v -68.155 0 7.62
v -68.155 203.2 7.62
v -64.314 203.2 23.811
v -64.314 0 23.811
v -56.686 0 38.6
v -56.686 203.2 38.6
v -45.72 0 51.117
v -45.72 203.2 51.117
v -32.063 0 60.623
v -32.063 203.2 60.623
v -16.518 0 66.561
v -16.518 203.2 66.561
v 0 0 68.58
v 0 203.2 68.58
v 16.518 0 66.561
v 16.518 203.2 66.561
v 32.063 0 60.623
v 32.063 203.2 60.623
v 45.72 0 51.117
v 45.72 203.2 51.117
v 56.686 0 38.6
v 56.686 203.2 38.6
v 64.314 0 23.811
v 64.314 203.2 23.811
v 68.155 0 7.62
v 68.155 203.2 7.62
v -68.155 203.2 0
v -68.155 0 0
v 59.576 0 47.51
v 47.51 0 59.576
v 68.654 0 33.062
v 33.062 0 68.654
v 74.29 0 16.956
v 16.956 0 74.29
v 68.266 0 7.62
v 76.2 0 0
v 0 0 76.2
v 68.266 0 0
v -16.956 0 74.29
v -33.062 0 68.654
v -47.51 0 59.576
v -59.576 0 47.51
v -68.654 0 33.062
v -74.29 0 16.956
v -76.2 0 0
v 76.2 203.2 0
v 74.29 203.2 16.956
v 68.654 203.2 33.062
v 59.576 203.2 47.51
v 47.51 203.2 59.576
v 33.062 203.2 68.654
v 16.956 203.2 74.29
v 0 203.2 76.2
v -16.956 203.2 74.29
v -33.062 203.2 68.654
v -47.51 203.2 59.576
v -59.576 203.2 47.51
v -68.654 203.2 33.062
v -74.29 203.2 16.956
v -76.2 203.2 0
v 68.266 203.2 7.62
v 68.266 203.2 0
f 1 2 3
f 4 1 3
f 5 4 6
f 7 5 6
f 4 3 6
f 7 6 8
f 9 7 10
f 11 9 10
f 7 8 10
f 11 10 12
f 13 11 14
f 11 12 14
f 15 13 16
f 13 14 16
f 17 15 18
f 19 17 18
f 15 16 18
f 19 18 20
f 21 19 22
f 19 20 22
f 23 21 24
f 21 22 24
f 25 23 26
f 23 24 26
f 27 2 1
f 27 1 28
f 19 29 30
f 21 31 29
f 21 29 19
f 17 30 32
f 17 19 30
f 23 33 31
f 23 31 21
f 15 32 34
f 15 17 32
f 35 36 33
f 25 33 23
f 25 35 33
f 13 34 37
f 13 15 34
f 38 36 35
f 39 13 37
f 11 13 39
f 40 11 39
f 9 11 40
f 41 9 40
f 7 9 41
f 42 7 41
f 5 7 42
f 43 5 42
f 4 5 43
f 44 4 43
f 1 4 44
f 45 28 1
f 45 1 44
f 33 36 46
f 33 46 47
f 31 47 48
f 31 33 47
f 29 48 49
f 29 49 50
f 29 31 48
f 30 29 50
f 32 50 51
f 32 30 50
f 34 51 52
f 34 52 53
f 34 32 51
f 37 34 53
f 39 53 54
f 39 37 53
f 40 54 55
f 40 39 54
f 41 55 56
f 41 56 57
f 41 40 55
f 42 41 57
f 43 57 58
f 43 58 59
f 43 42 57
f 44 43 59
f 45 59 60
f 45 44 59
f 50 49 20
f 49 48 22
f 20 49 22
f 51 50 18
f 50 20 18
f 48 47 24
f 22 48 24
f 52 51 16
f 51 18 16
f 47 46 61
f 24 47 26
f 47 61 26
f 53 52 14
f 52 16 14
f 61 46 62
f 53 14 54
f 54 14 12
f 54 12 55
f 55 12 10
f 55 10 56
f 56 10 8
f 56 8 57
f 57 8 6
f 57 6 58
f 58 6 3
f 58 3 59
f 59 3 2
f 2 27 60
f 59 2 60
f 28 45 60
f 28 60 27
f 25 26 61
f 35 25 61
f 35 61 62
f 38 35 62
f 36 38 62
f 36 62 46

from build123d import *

# Parameters (mm, degrees)
BOSS_EXTRUDE1_DEPTH = 203.2
CUT_EXTRUDE1_DEPTH  = 203.2
SKETCH3_W           = 136.421155183
SKETCH3_H           = 7.62
CUT_EXTRUDE2_DEPTH  = 203.2


with BuildPart() as part:
    # Sketch1 → Boss-Extrude1 (new body)
    with BuildSketch(Plane(origin=(0, 0, 0), x_dir=(1, 0, 0), z_dir=(0, 1, 0))):
        with BuildLine():
            Line((-76.2, 0), (76.2, 0))
            ThreePointArc((76.2, 0), (0, -76.2), (-76.2, 0))
        make_face()
    extrude(amount=BOSS_EXTRUDE1_DEPTH)

    # Sketch2 → Cut-Extrude1 (cut)
    with BuildSketch(Plane(origin=(0, 203.2, 0), x_dir=(1, 0, 0), z_dir=(0, 1, 0))):
        with BuildLine():
            Line((68.155351954, -7.62), (-68.155351954, -7.62))
            ThreePointArc((-68.155351954, -7.62), (0, -68.58), (68.155351954, -7.62))
        make_face()
    extrude(amount=-CUT_EXTRUDE1_DEPTH, mode=Mode.SUBTRACT)

    # Sketch3 → Cut-Extrude2 (cut)
    with BuildSketch(Plane(origin=(0, 203.2, 0), x_dir=(1, 0, 0), z_dir=(0, 1, 0))):
        with Locations((0.055225637, -3.81)):
            Rectangle(SKETCH3_W, SKETCH3_H)
    extrude(amount=-CUT_EXTRUDE2_DEPTH, mode=Mode.SUBTRACT)


solid = part.part
